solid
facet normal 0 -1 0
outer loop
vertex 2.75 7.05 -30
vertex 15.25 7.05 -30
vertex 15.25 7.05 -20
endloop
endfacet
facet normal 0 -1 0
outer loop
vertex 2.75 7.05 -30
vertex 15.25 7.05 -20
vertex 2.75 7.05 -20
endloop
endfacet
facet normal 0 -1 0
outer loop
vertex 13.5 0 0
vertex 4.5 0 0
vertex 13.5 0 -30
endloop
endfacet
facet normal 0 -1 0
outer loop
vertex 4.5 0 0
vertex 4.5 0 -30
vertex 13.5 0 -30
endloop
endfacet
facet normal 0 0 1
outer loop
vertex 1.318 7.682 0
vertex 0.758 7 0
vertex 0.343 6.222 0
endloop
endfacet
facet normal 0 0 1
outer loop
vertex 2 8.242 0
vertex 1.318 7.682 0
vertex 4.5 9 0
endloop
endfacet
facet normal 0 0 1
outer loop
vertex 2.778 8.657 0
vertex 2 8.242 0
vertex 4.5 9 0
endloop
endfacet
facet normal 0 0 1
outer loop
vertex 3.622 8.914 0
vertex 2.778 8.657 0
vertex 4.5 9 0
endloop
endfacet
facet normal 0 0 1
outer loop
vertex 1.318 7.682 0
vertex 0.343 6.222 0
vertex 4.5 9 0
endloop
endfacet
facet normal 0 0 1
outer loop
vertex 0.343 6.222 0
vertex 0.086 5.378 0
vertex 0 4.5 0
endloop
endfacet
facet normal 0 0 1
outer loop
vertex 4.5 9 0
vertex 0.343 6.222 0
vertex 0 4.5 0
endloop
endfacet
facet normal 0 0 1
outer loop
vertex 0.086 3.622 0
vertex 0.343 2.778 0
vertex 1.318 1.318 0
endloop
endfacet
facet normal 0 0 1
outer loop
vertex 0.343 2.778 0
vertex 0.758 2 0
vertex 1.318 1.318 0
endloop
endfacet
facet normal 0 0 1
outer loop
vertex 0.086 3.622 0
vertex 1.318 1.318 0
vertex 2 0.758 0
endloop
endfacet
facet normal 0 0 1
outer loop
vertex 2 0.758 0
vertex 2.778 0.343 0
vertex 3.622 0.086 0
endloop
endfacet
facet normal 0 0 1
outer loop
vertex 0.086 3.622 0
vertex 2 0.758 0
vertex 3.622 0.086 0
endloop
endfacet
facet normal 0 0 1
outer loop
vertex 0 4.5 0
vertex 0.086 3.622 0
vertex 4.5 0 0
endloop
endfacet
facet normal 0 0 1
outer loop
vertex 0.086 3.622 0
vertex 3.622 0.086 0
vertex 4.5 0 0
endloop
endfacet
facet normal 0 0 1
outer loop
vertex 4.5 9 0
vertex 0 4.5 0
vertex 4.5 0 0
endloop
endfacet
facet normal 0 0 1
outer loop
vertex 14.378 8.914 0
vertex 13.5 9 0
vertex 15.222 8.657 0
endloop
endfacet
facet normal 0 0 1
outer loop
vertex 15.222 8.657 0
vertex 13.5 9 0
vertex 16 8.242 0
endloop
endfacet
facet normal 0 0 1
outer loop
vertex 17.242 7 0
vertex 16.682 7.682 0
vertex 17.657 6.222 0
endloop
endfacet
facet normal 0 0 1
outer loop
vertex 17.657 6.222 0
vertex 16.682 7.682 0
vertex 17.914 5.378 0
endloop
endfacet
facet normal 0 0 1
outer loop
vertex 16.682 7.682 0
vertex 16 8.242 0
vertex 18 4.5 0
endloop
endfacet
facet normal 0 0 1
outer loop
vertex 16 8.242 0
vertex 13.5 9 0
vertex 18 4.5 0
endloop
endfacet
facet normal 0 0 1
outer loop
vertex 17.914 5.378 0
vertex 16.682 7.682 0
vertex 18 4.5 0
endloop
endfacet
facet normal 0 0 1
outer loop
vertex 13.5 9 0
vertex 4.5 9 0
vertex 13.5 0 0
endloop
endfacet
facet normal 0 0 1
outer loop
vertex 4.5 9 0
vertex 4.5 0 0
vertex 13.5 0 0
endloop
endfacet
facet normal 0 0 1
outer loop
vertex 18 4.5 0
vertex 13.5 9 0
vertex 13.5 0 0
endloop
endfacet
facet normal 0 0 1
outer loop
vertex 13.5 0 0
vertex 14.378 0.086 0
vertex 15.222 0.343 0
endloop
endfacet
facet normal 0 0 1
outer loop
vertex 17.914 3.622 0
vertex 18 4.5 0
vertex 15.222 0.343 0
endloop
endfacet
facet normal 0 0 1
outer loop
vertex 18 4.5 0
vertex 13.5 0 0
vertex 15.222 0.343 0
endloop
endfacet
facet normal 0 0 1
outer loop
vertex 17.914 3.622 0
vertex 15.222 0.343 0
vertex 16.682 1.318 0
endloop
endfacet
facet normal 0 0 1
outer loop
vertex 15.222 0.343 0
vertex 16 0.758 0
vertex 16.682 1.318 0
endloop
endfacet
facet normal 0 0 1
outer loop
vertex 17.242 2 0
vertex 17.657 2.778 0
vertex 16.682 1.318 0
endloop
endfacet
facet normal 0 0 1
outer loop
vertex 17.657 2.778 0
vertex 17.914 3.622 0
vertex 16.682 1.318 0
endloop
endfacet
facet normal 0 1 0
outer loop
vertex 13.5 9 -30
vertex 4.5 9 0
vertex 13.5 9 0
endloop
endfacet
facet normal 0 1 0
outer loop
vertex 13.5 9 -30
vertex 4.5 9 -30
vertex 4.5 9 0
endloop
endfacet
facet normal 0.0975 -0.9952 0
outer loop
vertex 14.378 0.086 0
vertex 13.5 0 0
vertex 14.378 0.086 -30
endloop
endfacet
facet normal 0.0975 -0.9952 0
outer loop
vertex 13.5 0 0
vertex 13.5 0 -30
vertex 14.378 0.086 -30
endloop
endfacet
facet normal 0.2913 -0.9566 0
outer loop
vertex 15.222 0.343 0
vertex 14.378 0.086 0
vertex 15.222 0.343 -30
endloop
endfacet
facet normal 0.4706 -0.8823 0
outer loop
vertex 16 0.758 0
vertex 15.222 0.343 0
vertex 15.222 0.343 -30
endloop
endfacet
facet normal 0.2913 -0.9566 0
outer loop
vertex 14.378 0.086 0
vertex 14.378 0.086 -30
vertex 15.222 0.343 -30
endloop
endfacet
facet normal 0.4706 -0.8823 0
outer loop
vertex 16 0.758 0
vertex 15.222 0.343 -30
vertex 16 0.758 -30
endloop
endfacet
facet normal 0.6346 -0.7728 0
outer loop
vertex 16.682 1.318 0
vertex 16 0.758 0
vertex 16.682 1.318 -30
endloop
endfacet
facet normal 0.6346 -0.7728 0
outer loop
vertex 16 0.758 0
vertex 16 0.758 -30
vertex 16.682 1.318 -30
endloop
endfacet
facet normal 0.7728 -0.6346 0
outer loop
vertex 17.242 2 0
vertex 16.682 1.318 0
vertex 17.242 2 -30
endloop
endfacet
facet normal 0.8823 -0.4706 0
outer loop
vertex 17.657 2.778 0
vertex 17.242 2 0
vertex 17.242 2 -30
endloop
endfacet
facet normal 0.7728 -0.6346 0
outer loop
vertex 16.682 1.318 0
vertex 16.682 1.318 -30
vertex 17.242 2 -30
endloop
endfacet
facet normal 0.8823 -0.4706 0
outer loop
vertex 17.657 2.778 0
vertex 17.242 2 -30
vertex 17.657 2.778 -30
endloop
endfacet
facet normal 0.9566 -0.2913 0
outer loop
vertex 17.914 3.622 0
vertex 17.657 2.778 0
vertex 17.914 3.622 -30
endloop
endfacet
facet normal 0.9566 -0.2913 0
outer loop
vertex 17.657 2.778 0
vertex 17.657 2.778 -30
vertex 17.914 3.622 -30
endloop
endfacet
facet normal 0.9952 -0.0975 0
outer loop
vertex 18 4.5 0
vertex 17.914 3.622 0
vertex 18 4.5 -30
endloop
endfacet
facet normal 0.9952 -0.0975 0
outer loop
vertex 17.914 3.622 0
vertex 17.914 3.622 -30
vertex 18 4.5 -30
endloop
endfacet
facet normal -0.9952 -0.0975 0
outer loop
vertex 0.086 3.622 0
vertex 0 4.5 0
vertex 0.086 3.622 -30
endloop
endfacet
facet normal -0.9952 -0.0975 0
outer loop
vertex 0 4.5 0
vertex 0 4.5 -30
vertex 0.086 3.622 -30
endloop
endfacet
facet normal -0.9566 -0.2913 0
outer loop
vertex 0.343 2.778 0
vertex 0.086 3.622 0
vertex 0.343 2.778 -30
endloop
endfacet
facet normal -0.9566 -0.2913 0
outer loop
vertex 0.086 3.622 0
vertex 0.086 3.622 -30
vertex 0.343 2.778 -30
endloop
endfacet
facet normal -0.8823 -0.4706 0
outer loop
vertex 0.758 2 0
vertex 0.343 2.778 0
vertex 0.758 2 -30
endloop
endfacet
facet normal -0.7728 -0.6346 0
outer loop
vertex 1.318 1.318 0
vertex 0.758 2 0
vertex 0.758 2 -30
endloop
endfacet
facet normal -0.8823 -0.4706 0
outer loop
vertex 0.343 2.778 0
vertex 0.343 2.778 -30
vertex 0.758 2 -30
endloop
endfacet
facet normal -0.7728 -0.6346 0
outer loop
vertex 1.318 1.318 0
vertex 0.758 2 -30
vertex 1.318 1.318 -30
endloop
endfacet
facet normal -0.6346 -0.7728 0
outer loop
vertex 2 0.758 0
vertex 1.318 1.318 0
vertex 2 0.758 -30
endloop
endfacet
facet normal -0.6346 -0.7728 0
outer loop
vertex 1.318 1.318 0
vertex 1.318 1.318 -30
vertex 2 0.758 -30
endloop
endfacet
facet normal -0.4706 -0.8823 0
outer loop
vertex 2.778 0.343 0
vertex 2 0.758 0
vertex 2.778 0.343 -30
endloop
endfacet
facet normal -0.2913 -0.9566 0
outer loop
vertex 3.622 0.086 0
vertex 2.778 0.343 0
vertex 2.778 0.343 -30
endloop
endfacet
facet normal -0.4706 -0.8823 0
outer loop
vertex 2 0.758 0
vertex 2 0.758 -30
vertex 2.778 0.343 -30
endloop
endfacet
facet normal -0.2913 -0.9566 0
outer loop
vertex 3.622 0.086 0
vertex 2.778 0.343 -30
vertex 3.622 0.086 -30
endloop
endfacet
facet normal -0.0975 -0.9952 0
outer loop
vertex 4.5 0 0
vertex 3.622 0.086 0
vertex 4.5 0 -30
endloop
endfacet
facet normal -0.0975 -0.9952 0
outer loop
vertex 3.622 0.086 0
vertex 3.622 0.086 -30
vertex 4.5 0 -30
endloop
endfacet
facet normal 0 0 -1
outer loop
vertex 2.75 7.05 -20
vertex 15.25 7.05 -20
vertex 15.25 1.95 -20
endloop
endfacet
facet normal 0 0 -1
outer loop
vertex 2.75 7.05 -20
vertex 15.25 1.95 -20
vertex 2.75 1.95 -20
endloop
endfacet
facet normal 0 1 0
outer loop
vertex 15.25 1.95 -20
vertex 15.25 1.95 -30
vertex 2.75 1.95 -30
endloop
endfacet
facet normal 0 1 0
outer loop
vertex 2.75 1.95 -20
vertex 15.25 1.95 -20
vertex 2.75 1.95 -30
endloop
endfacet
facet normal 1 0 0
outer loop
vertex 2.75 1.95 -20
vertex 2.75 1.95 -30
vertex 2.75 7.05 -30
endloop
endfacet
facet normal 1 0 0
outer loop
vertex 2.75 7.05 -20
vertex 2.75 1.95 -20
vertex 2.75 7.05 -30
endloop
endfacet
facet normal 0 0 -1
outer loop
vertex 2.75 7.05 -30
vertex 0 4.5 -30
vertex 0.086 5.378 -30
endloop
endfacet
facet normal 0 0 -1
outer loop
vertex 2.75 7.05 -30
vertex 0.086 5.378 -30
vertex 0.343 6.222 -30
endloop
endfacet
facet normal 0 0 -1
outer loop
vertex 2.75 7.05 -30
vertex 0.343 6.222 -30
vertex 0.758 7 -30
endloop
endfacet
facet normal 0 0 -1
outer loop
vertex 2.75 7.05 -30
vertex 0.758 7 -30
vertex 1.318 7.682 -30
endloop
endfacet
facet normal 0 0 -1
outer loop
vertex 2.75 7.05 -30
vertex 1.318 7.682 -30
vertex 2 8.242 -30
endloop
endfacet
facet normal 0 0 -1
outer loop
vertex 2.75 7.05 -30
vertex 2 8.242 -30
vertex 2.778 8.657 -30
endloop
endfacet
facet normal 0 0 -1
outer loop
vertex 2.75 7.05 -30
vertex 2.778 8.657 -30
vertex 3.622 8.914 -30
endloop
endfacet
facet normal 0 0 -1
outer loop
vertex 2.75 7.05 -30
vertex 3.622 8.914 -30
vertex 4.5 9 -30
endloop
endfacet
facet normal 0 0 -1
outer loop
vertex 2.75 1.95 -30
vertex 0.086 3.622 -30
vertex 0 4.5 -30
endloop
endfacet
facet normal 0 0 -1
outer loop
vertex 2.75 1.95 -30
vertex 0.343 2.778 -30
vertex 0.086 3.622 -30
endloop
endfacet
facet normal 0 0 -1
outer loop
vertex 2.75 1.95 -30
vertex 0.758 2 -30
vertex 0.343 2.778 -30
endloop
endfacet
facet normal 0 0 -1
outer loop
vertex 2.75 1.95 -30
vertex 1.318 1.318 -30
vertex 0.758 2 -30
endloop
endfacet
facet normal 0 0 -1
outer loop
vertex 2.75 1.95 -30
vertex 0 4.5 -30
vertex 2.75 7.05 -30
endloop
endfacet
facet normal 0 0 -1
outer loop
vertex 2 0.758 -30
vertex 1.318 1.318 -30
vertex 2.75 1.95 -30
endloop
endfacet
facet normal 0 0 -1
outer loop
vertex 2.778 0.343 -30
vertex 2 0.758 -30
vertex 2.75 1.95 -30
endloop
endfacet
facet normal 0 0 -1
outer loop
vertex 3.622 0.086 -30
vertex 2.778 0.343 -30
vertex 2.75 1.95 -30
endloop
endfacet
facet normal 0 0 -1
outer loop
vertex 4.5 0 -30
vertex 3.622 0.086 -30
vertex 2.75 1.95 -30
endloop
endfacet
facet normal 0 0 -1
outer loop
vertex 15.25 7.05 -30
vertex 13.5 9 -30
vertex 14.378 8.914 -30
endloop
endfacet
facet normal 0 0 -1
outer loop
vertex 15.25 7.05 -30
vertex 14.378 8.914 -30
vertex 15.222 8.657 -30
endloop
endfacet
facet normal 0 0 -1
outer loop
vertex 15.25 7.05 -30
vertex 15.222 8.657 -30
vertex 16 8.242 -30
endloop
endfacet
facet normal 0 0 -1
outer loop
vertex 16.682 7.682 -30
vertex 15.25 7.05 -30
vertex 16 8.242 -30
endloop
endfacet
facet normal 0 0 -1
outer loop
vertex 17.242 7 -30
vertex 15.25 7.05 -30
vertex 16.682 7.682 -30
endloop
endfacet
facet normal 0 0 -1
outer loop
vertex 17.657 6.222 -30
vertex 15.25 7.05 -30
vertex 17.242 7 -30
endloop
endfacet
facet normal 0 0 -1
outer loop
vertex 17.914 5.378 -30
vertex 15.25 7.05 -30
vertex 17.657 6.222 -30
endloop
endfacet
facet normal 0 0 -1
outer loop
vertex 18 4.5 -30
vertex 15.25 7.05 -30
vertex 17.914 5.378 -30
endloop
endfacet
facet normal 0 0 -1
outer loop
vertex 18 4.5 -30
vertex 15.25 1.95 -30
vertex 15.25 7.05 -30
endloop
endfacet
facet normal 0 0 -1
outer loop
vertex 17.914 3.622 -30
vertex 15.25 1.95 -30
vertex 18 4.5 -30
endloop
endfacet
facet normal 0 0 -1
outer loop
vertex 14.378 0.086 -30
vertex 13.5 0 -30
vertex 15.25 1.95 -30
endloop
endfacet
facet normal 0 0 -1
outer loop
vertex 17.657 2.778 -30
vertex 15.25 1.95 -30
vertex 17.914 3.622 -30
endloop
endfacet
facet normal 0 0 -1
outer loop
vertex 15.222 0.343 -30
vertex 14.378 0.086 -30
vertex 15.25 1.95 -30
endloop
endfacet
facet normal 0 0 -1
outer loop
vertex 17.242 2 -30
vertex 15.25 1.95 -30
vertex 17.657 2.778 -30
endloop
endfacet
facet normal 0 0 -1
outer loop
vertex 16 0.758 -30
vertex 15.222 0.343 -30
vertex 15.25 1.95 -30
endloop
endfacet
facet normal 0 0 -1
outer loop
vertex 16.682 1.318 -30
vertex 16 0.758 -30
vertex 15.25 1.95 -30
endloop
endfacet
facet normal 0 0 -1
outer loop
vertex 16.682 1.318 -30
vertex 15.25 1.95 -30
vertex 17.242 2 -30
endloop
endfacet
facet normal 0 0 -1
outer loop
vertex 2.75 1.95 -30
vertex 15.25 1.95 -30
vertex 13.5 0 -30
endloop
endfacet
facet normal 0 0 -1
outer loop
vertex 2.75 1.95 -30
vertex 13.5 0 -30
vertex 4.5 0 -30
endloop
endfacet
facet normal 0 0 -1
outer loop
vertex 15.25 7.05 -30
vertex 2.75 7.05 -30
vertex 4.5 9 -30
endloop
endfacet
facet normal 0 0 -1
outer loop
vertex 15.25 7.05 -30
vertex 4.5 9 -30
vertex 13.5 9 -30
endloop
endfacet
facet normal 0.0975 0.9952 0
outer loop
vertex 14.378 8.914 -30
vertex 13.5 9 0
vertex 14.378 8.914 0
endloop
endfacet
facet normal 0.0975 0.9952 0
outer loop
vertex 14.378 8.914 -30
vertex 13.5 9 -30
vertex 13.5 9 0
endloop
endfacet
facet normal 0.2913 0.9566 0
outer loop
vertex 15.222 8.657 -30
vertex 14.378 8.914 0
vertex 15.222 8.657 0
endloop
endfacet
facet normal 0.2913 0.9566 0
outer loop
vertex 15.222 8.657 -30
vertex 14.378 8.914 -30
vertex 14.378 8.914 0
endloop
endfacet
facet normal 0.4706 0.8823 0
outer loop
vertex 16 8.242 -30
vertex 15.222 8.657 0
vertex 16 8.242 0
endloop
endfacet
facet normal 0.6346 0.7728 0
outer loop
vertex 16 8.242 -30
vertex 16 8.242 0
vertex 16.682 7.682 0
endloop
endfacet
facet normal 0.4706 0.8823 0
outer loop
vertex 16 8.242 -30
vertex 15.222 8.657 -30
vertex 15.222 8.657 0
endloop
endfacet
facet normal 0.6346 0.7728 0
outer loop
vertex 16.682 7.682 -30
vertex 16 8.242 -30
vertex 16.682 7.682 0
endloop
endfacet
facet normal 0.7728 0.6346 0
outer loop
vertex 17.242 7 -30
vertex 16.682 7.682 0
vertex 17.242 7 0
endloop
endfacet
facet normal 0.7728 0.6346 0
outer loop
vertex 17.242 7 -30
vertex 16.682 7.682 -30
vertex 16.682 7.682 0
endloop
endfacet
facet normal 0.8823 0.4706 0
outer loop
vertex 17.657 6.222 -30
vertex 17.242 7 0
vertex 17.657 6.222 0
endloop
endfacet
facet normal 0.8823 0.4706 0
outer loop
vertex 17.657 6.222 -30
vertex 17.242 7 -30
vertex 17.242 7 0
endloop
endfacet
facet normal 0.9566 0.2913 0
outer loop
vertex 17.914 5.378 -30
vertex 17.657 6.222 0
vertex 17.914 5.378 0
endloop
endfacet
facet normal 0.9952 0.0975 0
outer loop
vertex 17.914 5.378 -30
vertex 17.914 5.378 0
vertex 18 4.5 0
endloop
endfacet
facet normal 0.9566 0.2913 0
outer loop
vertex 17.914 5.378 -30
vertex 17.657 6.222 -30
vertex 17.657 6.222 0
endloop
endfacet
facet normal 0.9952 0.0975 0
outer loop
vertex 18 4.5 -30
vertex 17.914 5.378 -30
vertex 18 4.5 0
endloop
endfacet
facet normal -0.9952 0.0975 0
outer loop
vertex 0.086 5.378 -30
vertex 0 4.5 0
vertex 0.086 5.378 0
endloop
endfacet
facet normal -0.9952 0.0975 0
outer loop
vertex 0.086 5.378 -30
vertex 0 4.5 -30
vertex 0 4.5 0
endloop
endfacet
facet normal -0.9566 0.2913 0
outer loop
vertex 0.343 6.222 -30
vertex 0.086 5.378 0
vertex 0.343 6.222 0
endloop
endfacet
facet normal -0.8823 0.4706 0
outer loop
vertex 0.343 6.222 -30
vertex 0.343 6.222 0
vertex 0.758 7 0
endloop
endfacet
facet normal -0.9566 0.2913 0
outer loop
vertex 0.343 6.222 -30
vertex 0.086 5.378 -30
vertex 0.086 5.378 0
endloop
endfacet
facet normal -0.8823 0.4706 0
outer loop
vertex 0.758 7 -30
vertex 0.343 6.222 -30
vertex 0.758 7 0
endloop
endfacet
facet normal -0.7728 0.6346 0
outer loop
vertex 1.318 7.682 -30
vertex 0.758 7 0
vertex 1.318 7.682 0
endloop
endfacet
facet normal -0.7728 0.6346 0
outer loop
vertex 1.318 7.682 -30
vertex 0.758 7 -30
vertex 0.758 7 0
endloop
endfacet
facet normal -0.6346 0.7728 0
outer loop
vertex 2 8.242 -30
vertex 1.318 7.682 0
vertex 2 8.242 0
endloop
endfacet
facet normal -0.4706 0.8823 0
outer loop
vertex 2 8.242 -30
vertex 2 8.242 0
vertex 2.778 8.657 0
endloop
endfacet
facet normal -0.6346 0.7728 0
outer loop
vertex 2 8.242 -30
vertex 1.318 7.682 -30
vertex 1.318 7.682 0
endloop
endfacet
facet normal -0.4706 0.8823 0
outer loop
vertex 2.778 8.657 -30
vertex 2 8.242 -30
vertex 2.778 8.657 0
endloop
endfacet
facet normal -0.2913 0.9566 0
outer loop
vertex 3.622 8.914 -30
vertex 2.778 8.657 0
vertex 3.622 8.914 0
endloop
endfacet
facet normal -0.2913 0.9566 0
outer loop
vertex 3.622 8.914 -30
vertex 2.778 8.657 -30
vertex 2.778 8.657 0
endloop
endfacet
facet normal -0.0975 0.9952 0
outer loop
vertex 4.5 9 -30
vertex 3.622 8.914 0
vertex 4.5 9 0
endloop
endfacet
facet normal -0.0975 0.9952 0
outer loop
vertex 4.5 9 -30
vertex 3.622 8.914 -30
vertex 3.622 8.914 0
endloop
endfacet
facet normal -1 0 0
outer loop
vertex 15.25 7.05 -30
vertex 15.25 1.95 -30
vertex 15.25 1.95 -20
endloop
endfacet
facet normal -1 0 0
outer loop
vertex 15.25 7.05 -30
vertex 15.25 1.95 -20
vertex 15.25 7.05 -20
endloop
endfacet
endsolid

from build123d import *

# Parameters (mm, degrees)
SKETCH1_W           = 18
SKETCH1_H           = 30
BOSS_EXTRUDE1_DEPTH = 9
SKETCH2_W           = 12.5
SKETCH2_H           = 5.1
CUT_EXTRUDE1_DEPTH  = 10
FILLET1_R           = 4.5


with BuildPart() as part:
    # Sketch1 → Boss-Extrude1 (new body)
    with BuildSketch(Plane(origin=(0, 0, 0), x_dir=(1, 0, 0), z_dir=(0, 1, 0))):
        with Locations((9, 15)):
            Rectangle(SKETCH1_W, SKETCH1_H)
    extrude(amount=BOSS_EXTRUDE1_DEPTH)

    # Sketch2 → Cut-Extrude1 (cut)
    with BuildSketch(Plane(origin=(0, 0, -30), x_dir=(-1, 0, 0), z_dir=(0, 0, -1))):
        with Locations((-9, 4.5)):
            Rectangle(SKETCH2_W, SKETCH2_H)
    extrude(amount=-CUT_EXTRUDE1_DEPTH, mode=Mode.SUBTRACT)

    # Fillet1
    fillet1_edges = [part.edges().sort_by_distance(p)[0] for p in [
        (0, 0, -15),
        (0, 9, -15),
        (18, 0, -15),
        (18, 9, -15),
    ]]
    fillet(fillet1_edges, radius=FILLET1_R - 0.0001)  # a hair under: the kernel refuses the full size


solid = part.part
